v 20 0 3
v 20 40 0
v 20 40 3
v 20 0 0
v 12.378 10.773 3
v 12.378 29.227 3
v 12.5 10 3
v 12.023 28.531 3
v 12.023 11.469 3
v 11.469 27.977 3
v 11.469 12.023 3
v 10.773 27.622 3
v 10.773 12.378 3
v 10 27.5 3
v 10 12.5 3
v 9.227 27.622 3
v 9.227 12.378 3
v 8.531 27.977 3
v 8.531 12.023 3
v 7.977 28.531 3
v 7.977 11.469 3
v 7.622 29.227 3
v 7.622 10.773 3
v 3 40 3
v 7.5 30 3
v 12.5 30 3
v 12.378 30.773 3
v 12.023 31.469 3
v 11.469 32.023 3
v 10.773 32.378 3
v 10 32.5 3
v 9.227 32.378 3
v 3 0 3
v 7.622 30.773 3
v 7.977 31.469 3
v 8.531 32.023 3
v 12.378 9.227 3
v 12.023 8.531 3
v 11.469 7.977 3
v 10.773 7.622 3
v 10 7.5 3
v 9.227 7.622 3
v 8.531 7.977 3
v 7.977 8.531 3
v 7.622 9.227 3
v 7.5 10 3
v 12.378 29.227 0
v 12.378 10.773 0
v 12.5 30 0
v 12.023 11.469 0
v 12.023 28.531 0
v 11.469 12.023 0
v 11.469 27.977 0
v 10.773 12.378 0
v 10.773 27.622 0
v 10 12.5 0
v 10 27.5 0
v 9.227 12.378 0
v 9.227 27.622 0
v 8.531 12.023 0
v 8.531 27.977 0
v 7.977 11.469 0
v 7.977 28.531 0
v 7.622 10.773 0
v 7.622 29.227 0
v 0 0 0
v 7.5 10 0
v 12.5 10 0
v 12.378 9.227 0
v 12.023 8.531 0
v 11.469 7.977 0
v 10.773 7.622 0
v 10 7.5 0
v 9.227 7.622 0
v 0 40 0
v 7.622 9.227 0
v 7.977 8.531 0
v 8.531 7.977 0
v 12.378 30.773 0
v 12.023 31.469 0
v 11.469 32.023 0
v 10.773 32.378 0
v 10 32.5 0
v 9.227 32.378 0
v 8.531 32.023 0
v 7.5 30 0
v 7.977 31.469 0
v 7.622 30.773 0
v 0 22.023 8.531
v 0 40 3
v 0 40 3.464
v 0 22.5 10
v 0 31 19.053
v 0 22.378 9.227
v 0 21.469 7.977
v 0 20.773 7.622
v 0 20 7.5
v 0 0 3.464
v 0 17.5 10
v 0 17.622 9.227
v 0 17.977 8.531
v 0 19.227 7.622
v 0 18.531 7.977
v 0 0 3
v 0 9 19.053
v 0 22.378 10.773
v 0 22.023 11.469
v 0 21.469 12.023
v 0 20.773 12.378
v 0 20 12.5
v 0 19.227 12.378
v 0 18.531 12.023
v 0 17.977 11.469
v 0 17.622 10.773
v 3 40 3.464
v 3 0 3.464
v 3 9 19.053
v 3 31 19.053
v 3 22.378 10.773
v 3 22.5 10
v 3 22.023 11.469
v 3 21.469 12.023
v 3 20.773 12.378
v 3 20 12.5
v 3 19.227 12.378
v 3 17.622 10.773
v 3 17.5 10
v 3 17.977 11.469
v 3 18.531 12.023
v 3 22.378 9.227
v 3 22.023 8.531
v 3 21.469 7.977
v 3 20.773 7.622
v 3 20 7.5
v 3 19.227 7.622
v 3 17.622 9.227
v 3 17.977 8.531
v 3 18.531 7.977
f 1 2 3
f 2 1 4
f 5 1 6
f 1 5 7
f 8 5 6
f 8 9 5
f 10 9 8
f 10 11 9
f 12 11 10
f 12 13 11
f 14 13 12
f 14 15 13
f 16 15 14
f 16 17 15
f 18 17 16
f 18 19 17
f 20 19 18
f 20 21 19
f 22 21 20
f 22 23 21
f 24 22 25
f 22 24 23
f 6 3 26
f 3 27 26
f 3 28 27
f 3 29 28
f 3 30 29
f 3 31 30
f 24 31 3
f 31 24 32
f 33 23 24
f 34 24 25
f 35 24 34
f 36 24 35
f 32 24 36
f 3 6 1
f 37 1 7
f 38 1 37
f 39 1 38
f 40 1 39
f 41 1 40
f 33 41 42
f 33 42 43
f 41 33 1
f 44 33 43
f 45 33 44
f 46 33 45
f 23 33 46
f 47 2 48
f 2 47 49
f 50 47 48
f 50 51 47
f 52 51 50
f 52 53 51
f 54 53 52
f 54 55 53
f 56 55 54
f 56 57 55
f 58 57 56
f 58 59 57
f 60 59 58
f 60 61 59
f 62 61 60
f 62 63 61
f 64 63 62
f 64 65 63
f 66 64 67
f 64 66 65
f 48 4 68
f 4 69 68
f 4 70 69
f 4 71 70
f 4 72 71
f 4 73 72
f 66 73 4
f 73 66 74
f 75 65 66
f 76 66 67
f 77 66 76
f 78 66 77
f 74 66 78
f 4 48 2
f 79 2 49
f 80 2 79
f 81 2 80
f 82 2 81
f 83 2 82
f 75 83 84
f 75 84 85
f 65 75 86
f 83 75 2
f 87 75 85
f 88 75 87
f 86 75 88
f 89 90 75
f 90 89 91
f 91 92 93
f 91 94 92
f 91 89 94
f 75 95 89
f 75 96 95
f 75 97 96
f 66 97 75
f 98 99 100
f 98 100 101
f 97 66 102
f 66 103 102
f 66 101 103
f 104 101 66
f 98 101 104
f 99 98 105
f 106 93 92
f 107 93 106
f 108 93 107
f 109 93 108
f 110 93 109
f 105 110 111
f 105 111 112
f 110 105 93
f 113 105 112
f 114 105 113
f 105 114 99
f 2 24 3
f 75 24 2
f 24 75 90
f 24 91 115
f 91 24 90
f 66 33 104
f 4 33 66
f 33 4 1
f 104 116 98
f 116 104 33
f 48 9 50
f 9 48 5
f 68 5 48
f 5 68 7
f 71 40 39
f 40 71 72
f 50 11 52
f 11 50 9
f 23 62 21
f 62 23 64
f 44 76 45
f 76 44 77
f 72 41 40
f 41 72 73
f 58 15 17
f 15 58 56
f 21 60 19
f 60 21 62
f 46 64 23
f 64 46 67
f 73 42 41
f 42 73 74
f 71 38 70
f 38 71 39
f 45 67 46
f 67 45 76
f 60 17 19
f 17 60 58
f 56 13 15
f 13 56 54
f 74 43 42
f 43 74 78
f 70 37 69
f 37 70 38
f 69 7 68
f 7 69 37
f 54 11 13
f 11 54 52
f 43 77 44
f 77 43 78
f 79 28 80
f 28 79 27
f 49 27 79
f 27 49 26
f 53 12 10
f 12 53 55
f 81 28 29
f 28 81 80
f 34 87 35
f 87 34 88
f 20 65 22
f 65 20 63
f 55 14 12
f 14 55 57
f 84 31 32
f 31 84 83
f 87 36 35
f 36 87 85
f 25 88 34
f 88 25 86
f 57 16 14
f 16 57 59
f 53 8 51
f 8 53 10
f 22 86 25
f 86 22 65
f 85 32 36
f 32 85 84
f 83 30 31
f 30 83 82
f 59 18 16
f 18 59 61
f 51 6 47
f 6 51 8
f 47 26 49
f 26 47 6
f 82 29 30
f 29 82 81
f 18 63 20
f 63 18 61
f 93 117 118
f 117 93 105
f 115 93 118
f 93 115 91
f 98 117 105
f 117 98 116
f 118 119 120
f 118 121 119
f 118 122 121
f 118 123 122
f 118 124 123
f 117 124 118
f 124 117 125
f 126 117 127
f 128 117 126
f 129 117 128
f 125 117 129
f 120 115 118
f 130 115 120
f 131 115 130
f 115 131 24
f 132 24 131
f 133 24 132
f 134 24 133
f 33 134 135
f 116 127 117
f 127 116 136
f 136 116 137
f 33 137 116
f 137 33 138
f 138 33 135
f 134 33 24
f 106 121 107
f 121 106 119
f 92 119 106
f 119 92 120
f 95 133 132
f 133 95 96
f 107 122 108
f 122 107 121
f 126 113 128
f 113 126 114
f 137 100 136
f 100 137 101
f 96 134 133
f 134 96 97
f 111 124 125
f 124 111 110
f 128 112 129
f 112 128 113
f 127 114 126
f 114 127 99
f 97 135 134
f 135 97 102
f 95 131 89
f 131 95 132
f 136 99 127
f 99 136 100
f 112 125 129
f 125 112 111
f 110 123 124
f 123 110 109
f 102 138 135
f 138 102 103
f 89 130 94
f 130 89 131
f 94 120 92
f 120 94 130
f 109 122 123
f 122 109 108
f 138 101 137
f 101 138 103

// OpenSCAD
module base(anchoc,largoc, altoc, alturaAgujero,diamAgujero){
    union(){
            difference(){
                cube([anchoc,largoc,altoc]);
                translate([10,10,0])
                    cylinder(h= alturaAgujero, d = diamAgujero, $fn=20);
                translate([10,30,0])
                    cylinder(h= alturaAgujero, d = diamAgujero, $fn=20);
            } 
           difference(){ 
                rotate([90,0,90])
                    translate([20,0,0])
                        cylinder(h = alturaAgujero, r=22, $fn=6);
                
               translate([-30,-5,-50])
                    cube (50);
               translate([0,-5,0])
                    cube (5);
               translate([0,40,0])
                    cube (5);
               rotate([90,0,90])
                    translate([20,10,0])
                        cylinder(h= alturaAgujero, d = diamAgujero, $fn=20);
           }
    }
}
base(20,40,3,3,5);
